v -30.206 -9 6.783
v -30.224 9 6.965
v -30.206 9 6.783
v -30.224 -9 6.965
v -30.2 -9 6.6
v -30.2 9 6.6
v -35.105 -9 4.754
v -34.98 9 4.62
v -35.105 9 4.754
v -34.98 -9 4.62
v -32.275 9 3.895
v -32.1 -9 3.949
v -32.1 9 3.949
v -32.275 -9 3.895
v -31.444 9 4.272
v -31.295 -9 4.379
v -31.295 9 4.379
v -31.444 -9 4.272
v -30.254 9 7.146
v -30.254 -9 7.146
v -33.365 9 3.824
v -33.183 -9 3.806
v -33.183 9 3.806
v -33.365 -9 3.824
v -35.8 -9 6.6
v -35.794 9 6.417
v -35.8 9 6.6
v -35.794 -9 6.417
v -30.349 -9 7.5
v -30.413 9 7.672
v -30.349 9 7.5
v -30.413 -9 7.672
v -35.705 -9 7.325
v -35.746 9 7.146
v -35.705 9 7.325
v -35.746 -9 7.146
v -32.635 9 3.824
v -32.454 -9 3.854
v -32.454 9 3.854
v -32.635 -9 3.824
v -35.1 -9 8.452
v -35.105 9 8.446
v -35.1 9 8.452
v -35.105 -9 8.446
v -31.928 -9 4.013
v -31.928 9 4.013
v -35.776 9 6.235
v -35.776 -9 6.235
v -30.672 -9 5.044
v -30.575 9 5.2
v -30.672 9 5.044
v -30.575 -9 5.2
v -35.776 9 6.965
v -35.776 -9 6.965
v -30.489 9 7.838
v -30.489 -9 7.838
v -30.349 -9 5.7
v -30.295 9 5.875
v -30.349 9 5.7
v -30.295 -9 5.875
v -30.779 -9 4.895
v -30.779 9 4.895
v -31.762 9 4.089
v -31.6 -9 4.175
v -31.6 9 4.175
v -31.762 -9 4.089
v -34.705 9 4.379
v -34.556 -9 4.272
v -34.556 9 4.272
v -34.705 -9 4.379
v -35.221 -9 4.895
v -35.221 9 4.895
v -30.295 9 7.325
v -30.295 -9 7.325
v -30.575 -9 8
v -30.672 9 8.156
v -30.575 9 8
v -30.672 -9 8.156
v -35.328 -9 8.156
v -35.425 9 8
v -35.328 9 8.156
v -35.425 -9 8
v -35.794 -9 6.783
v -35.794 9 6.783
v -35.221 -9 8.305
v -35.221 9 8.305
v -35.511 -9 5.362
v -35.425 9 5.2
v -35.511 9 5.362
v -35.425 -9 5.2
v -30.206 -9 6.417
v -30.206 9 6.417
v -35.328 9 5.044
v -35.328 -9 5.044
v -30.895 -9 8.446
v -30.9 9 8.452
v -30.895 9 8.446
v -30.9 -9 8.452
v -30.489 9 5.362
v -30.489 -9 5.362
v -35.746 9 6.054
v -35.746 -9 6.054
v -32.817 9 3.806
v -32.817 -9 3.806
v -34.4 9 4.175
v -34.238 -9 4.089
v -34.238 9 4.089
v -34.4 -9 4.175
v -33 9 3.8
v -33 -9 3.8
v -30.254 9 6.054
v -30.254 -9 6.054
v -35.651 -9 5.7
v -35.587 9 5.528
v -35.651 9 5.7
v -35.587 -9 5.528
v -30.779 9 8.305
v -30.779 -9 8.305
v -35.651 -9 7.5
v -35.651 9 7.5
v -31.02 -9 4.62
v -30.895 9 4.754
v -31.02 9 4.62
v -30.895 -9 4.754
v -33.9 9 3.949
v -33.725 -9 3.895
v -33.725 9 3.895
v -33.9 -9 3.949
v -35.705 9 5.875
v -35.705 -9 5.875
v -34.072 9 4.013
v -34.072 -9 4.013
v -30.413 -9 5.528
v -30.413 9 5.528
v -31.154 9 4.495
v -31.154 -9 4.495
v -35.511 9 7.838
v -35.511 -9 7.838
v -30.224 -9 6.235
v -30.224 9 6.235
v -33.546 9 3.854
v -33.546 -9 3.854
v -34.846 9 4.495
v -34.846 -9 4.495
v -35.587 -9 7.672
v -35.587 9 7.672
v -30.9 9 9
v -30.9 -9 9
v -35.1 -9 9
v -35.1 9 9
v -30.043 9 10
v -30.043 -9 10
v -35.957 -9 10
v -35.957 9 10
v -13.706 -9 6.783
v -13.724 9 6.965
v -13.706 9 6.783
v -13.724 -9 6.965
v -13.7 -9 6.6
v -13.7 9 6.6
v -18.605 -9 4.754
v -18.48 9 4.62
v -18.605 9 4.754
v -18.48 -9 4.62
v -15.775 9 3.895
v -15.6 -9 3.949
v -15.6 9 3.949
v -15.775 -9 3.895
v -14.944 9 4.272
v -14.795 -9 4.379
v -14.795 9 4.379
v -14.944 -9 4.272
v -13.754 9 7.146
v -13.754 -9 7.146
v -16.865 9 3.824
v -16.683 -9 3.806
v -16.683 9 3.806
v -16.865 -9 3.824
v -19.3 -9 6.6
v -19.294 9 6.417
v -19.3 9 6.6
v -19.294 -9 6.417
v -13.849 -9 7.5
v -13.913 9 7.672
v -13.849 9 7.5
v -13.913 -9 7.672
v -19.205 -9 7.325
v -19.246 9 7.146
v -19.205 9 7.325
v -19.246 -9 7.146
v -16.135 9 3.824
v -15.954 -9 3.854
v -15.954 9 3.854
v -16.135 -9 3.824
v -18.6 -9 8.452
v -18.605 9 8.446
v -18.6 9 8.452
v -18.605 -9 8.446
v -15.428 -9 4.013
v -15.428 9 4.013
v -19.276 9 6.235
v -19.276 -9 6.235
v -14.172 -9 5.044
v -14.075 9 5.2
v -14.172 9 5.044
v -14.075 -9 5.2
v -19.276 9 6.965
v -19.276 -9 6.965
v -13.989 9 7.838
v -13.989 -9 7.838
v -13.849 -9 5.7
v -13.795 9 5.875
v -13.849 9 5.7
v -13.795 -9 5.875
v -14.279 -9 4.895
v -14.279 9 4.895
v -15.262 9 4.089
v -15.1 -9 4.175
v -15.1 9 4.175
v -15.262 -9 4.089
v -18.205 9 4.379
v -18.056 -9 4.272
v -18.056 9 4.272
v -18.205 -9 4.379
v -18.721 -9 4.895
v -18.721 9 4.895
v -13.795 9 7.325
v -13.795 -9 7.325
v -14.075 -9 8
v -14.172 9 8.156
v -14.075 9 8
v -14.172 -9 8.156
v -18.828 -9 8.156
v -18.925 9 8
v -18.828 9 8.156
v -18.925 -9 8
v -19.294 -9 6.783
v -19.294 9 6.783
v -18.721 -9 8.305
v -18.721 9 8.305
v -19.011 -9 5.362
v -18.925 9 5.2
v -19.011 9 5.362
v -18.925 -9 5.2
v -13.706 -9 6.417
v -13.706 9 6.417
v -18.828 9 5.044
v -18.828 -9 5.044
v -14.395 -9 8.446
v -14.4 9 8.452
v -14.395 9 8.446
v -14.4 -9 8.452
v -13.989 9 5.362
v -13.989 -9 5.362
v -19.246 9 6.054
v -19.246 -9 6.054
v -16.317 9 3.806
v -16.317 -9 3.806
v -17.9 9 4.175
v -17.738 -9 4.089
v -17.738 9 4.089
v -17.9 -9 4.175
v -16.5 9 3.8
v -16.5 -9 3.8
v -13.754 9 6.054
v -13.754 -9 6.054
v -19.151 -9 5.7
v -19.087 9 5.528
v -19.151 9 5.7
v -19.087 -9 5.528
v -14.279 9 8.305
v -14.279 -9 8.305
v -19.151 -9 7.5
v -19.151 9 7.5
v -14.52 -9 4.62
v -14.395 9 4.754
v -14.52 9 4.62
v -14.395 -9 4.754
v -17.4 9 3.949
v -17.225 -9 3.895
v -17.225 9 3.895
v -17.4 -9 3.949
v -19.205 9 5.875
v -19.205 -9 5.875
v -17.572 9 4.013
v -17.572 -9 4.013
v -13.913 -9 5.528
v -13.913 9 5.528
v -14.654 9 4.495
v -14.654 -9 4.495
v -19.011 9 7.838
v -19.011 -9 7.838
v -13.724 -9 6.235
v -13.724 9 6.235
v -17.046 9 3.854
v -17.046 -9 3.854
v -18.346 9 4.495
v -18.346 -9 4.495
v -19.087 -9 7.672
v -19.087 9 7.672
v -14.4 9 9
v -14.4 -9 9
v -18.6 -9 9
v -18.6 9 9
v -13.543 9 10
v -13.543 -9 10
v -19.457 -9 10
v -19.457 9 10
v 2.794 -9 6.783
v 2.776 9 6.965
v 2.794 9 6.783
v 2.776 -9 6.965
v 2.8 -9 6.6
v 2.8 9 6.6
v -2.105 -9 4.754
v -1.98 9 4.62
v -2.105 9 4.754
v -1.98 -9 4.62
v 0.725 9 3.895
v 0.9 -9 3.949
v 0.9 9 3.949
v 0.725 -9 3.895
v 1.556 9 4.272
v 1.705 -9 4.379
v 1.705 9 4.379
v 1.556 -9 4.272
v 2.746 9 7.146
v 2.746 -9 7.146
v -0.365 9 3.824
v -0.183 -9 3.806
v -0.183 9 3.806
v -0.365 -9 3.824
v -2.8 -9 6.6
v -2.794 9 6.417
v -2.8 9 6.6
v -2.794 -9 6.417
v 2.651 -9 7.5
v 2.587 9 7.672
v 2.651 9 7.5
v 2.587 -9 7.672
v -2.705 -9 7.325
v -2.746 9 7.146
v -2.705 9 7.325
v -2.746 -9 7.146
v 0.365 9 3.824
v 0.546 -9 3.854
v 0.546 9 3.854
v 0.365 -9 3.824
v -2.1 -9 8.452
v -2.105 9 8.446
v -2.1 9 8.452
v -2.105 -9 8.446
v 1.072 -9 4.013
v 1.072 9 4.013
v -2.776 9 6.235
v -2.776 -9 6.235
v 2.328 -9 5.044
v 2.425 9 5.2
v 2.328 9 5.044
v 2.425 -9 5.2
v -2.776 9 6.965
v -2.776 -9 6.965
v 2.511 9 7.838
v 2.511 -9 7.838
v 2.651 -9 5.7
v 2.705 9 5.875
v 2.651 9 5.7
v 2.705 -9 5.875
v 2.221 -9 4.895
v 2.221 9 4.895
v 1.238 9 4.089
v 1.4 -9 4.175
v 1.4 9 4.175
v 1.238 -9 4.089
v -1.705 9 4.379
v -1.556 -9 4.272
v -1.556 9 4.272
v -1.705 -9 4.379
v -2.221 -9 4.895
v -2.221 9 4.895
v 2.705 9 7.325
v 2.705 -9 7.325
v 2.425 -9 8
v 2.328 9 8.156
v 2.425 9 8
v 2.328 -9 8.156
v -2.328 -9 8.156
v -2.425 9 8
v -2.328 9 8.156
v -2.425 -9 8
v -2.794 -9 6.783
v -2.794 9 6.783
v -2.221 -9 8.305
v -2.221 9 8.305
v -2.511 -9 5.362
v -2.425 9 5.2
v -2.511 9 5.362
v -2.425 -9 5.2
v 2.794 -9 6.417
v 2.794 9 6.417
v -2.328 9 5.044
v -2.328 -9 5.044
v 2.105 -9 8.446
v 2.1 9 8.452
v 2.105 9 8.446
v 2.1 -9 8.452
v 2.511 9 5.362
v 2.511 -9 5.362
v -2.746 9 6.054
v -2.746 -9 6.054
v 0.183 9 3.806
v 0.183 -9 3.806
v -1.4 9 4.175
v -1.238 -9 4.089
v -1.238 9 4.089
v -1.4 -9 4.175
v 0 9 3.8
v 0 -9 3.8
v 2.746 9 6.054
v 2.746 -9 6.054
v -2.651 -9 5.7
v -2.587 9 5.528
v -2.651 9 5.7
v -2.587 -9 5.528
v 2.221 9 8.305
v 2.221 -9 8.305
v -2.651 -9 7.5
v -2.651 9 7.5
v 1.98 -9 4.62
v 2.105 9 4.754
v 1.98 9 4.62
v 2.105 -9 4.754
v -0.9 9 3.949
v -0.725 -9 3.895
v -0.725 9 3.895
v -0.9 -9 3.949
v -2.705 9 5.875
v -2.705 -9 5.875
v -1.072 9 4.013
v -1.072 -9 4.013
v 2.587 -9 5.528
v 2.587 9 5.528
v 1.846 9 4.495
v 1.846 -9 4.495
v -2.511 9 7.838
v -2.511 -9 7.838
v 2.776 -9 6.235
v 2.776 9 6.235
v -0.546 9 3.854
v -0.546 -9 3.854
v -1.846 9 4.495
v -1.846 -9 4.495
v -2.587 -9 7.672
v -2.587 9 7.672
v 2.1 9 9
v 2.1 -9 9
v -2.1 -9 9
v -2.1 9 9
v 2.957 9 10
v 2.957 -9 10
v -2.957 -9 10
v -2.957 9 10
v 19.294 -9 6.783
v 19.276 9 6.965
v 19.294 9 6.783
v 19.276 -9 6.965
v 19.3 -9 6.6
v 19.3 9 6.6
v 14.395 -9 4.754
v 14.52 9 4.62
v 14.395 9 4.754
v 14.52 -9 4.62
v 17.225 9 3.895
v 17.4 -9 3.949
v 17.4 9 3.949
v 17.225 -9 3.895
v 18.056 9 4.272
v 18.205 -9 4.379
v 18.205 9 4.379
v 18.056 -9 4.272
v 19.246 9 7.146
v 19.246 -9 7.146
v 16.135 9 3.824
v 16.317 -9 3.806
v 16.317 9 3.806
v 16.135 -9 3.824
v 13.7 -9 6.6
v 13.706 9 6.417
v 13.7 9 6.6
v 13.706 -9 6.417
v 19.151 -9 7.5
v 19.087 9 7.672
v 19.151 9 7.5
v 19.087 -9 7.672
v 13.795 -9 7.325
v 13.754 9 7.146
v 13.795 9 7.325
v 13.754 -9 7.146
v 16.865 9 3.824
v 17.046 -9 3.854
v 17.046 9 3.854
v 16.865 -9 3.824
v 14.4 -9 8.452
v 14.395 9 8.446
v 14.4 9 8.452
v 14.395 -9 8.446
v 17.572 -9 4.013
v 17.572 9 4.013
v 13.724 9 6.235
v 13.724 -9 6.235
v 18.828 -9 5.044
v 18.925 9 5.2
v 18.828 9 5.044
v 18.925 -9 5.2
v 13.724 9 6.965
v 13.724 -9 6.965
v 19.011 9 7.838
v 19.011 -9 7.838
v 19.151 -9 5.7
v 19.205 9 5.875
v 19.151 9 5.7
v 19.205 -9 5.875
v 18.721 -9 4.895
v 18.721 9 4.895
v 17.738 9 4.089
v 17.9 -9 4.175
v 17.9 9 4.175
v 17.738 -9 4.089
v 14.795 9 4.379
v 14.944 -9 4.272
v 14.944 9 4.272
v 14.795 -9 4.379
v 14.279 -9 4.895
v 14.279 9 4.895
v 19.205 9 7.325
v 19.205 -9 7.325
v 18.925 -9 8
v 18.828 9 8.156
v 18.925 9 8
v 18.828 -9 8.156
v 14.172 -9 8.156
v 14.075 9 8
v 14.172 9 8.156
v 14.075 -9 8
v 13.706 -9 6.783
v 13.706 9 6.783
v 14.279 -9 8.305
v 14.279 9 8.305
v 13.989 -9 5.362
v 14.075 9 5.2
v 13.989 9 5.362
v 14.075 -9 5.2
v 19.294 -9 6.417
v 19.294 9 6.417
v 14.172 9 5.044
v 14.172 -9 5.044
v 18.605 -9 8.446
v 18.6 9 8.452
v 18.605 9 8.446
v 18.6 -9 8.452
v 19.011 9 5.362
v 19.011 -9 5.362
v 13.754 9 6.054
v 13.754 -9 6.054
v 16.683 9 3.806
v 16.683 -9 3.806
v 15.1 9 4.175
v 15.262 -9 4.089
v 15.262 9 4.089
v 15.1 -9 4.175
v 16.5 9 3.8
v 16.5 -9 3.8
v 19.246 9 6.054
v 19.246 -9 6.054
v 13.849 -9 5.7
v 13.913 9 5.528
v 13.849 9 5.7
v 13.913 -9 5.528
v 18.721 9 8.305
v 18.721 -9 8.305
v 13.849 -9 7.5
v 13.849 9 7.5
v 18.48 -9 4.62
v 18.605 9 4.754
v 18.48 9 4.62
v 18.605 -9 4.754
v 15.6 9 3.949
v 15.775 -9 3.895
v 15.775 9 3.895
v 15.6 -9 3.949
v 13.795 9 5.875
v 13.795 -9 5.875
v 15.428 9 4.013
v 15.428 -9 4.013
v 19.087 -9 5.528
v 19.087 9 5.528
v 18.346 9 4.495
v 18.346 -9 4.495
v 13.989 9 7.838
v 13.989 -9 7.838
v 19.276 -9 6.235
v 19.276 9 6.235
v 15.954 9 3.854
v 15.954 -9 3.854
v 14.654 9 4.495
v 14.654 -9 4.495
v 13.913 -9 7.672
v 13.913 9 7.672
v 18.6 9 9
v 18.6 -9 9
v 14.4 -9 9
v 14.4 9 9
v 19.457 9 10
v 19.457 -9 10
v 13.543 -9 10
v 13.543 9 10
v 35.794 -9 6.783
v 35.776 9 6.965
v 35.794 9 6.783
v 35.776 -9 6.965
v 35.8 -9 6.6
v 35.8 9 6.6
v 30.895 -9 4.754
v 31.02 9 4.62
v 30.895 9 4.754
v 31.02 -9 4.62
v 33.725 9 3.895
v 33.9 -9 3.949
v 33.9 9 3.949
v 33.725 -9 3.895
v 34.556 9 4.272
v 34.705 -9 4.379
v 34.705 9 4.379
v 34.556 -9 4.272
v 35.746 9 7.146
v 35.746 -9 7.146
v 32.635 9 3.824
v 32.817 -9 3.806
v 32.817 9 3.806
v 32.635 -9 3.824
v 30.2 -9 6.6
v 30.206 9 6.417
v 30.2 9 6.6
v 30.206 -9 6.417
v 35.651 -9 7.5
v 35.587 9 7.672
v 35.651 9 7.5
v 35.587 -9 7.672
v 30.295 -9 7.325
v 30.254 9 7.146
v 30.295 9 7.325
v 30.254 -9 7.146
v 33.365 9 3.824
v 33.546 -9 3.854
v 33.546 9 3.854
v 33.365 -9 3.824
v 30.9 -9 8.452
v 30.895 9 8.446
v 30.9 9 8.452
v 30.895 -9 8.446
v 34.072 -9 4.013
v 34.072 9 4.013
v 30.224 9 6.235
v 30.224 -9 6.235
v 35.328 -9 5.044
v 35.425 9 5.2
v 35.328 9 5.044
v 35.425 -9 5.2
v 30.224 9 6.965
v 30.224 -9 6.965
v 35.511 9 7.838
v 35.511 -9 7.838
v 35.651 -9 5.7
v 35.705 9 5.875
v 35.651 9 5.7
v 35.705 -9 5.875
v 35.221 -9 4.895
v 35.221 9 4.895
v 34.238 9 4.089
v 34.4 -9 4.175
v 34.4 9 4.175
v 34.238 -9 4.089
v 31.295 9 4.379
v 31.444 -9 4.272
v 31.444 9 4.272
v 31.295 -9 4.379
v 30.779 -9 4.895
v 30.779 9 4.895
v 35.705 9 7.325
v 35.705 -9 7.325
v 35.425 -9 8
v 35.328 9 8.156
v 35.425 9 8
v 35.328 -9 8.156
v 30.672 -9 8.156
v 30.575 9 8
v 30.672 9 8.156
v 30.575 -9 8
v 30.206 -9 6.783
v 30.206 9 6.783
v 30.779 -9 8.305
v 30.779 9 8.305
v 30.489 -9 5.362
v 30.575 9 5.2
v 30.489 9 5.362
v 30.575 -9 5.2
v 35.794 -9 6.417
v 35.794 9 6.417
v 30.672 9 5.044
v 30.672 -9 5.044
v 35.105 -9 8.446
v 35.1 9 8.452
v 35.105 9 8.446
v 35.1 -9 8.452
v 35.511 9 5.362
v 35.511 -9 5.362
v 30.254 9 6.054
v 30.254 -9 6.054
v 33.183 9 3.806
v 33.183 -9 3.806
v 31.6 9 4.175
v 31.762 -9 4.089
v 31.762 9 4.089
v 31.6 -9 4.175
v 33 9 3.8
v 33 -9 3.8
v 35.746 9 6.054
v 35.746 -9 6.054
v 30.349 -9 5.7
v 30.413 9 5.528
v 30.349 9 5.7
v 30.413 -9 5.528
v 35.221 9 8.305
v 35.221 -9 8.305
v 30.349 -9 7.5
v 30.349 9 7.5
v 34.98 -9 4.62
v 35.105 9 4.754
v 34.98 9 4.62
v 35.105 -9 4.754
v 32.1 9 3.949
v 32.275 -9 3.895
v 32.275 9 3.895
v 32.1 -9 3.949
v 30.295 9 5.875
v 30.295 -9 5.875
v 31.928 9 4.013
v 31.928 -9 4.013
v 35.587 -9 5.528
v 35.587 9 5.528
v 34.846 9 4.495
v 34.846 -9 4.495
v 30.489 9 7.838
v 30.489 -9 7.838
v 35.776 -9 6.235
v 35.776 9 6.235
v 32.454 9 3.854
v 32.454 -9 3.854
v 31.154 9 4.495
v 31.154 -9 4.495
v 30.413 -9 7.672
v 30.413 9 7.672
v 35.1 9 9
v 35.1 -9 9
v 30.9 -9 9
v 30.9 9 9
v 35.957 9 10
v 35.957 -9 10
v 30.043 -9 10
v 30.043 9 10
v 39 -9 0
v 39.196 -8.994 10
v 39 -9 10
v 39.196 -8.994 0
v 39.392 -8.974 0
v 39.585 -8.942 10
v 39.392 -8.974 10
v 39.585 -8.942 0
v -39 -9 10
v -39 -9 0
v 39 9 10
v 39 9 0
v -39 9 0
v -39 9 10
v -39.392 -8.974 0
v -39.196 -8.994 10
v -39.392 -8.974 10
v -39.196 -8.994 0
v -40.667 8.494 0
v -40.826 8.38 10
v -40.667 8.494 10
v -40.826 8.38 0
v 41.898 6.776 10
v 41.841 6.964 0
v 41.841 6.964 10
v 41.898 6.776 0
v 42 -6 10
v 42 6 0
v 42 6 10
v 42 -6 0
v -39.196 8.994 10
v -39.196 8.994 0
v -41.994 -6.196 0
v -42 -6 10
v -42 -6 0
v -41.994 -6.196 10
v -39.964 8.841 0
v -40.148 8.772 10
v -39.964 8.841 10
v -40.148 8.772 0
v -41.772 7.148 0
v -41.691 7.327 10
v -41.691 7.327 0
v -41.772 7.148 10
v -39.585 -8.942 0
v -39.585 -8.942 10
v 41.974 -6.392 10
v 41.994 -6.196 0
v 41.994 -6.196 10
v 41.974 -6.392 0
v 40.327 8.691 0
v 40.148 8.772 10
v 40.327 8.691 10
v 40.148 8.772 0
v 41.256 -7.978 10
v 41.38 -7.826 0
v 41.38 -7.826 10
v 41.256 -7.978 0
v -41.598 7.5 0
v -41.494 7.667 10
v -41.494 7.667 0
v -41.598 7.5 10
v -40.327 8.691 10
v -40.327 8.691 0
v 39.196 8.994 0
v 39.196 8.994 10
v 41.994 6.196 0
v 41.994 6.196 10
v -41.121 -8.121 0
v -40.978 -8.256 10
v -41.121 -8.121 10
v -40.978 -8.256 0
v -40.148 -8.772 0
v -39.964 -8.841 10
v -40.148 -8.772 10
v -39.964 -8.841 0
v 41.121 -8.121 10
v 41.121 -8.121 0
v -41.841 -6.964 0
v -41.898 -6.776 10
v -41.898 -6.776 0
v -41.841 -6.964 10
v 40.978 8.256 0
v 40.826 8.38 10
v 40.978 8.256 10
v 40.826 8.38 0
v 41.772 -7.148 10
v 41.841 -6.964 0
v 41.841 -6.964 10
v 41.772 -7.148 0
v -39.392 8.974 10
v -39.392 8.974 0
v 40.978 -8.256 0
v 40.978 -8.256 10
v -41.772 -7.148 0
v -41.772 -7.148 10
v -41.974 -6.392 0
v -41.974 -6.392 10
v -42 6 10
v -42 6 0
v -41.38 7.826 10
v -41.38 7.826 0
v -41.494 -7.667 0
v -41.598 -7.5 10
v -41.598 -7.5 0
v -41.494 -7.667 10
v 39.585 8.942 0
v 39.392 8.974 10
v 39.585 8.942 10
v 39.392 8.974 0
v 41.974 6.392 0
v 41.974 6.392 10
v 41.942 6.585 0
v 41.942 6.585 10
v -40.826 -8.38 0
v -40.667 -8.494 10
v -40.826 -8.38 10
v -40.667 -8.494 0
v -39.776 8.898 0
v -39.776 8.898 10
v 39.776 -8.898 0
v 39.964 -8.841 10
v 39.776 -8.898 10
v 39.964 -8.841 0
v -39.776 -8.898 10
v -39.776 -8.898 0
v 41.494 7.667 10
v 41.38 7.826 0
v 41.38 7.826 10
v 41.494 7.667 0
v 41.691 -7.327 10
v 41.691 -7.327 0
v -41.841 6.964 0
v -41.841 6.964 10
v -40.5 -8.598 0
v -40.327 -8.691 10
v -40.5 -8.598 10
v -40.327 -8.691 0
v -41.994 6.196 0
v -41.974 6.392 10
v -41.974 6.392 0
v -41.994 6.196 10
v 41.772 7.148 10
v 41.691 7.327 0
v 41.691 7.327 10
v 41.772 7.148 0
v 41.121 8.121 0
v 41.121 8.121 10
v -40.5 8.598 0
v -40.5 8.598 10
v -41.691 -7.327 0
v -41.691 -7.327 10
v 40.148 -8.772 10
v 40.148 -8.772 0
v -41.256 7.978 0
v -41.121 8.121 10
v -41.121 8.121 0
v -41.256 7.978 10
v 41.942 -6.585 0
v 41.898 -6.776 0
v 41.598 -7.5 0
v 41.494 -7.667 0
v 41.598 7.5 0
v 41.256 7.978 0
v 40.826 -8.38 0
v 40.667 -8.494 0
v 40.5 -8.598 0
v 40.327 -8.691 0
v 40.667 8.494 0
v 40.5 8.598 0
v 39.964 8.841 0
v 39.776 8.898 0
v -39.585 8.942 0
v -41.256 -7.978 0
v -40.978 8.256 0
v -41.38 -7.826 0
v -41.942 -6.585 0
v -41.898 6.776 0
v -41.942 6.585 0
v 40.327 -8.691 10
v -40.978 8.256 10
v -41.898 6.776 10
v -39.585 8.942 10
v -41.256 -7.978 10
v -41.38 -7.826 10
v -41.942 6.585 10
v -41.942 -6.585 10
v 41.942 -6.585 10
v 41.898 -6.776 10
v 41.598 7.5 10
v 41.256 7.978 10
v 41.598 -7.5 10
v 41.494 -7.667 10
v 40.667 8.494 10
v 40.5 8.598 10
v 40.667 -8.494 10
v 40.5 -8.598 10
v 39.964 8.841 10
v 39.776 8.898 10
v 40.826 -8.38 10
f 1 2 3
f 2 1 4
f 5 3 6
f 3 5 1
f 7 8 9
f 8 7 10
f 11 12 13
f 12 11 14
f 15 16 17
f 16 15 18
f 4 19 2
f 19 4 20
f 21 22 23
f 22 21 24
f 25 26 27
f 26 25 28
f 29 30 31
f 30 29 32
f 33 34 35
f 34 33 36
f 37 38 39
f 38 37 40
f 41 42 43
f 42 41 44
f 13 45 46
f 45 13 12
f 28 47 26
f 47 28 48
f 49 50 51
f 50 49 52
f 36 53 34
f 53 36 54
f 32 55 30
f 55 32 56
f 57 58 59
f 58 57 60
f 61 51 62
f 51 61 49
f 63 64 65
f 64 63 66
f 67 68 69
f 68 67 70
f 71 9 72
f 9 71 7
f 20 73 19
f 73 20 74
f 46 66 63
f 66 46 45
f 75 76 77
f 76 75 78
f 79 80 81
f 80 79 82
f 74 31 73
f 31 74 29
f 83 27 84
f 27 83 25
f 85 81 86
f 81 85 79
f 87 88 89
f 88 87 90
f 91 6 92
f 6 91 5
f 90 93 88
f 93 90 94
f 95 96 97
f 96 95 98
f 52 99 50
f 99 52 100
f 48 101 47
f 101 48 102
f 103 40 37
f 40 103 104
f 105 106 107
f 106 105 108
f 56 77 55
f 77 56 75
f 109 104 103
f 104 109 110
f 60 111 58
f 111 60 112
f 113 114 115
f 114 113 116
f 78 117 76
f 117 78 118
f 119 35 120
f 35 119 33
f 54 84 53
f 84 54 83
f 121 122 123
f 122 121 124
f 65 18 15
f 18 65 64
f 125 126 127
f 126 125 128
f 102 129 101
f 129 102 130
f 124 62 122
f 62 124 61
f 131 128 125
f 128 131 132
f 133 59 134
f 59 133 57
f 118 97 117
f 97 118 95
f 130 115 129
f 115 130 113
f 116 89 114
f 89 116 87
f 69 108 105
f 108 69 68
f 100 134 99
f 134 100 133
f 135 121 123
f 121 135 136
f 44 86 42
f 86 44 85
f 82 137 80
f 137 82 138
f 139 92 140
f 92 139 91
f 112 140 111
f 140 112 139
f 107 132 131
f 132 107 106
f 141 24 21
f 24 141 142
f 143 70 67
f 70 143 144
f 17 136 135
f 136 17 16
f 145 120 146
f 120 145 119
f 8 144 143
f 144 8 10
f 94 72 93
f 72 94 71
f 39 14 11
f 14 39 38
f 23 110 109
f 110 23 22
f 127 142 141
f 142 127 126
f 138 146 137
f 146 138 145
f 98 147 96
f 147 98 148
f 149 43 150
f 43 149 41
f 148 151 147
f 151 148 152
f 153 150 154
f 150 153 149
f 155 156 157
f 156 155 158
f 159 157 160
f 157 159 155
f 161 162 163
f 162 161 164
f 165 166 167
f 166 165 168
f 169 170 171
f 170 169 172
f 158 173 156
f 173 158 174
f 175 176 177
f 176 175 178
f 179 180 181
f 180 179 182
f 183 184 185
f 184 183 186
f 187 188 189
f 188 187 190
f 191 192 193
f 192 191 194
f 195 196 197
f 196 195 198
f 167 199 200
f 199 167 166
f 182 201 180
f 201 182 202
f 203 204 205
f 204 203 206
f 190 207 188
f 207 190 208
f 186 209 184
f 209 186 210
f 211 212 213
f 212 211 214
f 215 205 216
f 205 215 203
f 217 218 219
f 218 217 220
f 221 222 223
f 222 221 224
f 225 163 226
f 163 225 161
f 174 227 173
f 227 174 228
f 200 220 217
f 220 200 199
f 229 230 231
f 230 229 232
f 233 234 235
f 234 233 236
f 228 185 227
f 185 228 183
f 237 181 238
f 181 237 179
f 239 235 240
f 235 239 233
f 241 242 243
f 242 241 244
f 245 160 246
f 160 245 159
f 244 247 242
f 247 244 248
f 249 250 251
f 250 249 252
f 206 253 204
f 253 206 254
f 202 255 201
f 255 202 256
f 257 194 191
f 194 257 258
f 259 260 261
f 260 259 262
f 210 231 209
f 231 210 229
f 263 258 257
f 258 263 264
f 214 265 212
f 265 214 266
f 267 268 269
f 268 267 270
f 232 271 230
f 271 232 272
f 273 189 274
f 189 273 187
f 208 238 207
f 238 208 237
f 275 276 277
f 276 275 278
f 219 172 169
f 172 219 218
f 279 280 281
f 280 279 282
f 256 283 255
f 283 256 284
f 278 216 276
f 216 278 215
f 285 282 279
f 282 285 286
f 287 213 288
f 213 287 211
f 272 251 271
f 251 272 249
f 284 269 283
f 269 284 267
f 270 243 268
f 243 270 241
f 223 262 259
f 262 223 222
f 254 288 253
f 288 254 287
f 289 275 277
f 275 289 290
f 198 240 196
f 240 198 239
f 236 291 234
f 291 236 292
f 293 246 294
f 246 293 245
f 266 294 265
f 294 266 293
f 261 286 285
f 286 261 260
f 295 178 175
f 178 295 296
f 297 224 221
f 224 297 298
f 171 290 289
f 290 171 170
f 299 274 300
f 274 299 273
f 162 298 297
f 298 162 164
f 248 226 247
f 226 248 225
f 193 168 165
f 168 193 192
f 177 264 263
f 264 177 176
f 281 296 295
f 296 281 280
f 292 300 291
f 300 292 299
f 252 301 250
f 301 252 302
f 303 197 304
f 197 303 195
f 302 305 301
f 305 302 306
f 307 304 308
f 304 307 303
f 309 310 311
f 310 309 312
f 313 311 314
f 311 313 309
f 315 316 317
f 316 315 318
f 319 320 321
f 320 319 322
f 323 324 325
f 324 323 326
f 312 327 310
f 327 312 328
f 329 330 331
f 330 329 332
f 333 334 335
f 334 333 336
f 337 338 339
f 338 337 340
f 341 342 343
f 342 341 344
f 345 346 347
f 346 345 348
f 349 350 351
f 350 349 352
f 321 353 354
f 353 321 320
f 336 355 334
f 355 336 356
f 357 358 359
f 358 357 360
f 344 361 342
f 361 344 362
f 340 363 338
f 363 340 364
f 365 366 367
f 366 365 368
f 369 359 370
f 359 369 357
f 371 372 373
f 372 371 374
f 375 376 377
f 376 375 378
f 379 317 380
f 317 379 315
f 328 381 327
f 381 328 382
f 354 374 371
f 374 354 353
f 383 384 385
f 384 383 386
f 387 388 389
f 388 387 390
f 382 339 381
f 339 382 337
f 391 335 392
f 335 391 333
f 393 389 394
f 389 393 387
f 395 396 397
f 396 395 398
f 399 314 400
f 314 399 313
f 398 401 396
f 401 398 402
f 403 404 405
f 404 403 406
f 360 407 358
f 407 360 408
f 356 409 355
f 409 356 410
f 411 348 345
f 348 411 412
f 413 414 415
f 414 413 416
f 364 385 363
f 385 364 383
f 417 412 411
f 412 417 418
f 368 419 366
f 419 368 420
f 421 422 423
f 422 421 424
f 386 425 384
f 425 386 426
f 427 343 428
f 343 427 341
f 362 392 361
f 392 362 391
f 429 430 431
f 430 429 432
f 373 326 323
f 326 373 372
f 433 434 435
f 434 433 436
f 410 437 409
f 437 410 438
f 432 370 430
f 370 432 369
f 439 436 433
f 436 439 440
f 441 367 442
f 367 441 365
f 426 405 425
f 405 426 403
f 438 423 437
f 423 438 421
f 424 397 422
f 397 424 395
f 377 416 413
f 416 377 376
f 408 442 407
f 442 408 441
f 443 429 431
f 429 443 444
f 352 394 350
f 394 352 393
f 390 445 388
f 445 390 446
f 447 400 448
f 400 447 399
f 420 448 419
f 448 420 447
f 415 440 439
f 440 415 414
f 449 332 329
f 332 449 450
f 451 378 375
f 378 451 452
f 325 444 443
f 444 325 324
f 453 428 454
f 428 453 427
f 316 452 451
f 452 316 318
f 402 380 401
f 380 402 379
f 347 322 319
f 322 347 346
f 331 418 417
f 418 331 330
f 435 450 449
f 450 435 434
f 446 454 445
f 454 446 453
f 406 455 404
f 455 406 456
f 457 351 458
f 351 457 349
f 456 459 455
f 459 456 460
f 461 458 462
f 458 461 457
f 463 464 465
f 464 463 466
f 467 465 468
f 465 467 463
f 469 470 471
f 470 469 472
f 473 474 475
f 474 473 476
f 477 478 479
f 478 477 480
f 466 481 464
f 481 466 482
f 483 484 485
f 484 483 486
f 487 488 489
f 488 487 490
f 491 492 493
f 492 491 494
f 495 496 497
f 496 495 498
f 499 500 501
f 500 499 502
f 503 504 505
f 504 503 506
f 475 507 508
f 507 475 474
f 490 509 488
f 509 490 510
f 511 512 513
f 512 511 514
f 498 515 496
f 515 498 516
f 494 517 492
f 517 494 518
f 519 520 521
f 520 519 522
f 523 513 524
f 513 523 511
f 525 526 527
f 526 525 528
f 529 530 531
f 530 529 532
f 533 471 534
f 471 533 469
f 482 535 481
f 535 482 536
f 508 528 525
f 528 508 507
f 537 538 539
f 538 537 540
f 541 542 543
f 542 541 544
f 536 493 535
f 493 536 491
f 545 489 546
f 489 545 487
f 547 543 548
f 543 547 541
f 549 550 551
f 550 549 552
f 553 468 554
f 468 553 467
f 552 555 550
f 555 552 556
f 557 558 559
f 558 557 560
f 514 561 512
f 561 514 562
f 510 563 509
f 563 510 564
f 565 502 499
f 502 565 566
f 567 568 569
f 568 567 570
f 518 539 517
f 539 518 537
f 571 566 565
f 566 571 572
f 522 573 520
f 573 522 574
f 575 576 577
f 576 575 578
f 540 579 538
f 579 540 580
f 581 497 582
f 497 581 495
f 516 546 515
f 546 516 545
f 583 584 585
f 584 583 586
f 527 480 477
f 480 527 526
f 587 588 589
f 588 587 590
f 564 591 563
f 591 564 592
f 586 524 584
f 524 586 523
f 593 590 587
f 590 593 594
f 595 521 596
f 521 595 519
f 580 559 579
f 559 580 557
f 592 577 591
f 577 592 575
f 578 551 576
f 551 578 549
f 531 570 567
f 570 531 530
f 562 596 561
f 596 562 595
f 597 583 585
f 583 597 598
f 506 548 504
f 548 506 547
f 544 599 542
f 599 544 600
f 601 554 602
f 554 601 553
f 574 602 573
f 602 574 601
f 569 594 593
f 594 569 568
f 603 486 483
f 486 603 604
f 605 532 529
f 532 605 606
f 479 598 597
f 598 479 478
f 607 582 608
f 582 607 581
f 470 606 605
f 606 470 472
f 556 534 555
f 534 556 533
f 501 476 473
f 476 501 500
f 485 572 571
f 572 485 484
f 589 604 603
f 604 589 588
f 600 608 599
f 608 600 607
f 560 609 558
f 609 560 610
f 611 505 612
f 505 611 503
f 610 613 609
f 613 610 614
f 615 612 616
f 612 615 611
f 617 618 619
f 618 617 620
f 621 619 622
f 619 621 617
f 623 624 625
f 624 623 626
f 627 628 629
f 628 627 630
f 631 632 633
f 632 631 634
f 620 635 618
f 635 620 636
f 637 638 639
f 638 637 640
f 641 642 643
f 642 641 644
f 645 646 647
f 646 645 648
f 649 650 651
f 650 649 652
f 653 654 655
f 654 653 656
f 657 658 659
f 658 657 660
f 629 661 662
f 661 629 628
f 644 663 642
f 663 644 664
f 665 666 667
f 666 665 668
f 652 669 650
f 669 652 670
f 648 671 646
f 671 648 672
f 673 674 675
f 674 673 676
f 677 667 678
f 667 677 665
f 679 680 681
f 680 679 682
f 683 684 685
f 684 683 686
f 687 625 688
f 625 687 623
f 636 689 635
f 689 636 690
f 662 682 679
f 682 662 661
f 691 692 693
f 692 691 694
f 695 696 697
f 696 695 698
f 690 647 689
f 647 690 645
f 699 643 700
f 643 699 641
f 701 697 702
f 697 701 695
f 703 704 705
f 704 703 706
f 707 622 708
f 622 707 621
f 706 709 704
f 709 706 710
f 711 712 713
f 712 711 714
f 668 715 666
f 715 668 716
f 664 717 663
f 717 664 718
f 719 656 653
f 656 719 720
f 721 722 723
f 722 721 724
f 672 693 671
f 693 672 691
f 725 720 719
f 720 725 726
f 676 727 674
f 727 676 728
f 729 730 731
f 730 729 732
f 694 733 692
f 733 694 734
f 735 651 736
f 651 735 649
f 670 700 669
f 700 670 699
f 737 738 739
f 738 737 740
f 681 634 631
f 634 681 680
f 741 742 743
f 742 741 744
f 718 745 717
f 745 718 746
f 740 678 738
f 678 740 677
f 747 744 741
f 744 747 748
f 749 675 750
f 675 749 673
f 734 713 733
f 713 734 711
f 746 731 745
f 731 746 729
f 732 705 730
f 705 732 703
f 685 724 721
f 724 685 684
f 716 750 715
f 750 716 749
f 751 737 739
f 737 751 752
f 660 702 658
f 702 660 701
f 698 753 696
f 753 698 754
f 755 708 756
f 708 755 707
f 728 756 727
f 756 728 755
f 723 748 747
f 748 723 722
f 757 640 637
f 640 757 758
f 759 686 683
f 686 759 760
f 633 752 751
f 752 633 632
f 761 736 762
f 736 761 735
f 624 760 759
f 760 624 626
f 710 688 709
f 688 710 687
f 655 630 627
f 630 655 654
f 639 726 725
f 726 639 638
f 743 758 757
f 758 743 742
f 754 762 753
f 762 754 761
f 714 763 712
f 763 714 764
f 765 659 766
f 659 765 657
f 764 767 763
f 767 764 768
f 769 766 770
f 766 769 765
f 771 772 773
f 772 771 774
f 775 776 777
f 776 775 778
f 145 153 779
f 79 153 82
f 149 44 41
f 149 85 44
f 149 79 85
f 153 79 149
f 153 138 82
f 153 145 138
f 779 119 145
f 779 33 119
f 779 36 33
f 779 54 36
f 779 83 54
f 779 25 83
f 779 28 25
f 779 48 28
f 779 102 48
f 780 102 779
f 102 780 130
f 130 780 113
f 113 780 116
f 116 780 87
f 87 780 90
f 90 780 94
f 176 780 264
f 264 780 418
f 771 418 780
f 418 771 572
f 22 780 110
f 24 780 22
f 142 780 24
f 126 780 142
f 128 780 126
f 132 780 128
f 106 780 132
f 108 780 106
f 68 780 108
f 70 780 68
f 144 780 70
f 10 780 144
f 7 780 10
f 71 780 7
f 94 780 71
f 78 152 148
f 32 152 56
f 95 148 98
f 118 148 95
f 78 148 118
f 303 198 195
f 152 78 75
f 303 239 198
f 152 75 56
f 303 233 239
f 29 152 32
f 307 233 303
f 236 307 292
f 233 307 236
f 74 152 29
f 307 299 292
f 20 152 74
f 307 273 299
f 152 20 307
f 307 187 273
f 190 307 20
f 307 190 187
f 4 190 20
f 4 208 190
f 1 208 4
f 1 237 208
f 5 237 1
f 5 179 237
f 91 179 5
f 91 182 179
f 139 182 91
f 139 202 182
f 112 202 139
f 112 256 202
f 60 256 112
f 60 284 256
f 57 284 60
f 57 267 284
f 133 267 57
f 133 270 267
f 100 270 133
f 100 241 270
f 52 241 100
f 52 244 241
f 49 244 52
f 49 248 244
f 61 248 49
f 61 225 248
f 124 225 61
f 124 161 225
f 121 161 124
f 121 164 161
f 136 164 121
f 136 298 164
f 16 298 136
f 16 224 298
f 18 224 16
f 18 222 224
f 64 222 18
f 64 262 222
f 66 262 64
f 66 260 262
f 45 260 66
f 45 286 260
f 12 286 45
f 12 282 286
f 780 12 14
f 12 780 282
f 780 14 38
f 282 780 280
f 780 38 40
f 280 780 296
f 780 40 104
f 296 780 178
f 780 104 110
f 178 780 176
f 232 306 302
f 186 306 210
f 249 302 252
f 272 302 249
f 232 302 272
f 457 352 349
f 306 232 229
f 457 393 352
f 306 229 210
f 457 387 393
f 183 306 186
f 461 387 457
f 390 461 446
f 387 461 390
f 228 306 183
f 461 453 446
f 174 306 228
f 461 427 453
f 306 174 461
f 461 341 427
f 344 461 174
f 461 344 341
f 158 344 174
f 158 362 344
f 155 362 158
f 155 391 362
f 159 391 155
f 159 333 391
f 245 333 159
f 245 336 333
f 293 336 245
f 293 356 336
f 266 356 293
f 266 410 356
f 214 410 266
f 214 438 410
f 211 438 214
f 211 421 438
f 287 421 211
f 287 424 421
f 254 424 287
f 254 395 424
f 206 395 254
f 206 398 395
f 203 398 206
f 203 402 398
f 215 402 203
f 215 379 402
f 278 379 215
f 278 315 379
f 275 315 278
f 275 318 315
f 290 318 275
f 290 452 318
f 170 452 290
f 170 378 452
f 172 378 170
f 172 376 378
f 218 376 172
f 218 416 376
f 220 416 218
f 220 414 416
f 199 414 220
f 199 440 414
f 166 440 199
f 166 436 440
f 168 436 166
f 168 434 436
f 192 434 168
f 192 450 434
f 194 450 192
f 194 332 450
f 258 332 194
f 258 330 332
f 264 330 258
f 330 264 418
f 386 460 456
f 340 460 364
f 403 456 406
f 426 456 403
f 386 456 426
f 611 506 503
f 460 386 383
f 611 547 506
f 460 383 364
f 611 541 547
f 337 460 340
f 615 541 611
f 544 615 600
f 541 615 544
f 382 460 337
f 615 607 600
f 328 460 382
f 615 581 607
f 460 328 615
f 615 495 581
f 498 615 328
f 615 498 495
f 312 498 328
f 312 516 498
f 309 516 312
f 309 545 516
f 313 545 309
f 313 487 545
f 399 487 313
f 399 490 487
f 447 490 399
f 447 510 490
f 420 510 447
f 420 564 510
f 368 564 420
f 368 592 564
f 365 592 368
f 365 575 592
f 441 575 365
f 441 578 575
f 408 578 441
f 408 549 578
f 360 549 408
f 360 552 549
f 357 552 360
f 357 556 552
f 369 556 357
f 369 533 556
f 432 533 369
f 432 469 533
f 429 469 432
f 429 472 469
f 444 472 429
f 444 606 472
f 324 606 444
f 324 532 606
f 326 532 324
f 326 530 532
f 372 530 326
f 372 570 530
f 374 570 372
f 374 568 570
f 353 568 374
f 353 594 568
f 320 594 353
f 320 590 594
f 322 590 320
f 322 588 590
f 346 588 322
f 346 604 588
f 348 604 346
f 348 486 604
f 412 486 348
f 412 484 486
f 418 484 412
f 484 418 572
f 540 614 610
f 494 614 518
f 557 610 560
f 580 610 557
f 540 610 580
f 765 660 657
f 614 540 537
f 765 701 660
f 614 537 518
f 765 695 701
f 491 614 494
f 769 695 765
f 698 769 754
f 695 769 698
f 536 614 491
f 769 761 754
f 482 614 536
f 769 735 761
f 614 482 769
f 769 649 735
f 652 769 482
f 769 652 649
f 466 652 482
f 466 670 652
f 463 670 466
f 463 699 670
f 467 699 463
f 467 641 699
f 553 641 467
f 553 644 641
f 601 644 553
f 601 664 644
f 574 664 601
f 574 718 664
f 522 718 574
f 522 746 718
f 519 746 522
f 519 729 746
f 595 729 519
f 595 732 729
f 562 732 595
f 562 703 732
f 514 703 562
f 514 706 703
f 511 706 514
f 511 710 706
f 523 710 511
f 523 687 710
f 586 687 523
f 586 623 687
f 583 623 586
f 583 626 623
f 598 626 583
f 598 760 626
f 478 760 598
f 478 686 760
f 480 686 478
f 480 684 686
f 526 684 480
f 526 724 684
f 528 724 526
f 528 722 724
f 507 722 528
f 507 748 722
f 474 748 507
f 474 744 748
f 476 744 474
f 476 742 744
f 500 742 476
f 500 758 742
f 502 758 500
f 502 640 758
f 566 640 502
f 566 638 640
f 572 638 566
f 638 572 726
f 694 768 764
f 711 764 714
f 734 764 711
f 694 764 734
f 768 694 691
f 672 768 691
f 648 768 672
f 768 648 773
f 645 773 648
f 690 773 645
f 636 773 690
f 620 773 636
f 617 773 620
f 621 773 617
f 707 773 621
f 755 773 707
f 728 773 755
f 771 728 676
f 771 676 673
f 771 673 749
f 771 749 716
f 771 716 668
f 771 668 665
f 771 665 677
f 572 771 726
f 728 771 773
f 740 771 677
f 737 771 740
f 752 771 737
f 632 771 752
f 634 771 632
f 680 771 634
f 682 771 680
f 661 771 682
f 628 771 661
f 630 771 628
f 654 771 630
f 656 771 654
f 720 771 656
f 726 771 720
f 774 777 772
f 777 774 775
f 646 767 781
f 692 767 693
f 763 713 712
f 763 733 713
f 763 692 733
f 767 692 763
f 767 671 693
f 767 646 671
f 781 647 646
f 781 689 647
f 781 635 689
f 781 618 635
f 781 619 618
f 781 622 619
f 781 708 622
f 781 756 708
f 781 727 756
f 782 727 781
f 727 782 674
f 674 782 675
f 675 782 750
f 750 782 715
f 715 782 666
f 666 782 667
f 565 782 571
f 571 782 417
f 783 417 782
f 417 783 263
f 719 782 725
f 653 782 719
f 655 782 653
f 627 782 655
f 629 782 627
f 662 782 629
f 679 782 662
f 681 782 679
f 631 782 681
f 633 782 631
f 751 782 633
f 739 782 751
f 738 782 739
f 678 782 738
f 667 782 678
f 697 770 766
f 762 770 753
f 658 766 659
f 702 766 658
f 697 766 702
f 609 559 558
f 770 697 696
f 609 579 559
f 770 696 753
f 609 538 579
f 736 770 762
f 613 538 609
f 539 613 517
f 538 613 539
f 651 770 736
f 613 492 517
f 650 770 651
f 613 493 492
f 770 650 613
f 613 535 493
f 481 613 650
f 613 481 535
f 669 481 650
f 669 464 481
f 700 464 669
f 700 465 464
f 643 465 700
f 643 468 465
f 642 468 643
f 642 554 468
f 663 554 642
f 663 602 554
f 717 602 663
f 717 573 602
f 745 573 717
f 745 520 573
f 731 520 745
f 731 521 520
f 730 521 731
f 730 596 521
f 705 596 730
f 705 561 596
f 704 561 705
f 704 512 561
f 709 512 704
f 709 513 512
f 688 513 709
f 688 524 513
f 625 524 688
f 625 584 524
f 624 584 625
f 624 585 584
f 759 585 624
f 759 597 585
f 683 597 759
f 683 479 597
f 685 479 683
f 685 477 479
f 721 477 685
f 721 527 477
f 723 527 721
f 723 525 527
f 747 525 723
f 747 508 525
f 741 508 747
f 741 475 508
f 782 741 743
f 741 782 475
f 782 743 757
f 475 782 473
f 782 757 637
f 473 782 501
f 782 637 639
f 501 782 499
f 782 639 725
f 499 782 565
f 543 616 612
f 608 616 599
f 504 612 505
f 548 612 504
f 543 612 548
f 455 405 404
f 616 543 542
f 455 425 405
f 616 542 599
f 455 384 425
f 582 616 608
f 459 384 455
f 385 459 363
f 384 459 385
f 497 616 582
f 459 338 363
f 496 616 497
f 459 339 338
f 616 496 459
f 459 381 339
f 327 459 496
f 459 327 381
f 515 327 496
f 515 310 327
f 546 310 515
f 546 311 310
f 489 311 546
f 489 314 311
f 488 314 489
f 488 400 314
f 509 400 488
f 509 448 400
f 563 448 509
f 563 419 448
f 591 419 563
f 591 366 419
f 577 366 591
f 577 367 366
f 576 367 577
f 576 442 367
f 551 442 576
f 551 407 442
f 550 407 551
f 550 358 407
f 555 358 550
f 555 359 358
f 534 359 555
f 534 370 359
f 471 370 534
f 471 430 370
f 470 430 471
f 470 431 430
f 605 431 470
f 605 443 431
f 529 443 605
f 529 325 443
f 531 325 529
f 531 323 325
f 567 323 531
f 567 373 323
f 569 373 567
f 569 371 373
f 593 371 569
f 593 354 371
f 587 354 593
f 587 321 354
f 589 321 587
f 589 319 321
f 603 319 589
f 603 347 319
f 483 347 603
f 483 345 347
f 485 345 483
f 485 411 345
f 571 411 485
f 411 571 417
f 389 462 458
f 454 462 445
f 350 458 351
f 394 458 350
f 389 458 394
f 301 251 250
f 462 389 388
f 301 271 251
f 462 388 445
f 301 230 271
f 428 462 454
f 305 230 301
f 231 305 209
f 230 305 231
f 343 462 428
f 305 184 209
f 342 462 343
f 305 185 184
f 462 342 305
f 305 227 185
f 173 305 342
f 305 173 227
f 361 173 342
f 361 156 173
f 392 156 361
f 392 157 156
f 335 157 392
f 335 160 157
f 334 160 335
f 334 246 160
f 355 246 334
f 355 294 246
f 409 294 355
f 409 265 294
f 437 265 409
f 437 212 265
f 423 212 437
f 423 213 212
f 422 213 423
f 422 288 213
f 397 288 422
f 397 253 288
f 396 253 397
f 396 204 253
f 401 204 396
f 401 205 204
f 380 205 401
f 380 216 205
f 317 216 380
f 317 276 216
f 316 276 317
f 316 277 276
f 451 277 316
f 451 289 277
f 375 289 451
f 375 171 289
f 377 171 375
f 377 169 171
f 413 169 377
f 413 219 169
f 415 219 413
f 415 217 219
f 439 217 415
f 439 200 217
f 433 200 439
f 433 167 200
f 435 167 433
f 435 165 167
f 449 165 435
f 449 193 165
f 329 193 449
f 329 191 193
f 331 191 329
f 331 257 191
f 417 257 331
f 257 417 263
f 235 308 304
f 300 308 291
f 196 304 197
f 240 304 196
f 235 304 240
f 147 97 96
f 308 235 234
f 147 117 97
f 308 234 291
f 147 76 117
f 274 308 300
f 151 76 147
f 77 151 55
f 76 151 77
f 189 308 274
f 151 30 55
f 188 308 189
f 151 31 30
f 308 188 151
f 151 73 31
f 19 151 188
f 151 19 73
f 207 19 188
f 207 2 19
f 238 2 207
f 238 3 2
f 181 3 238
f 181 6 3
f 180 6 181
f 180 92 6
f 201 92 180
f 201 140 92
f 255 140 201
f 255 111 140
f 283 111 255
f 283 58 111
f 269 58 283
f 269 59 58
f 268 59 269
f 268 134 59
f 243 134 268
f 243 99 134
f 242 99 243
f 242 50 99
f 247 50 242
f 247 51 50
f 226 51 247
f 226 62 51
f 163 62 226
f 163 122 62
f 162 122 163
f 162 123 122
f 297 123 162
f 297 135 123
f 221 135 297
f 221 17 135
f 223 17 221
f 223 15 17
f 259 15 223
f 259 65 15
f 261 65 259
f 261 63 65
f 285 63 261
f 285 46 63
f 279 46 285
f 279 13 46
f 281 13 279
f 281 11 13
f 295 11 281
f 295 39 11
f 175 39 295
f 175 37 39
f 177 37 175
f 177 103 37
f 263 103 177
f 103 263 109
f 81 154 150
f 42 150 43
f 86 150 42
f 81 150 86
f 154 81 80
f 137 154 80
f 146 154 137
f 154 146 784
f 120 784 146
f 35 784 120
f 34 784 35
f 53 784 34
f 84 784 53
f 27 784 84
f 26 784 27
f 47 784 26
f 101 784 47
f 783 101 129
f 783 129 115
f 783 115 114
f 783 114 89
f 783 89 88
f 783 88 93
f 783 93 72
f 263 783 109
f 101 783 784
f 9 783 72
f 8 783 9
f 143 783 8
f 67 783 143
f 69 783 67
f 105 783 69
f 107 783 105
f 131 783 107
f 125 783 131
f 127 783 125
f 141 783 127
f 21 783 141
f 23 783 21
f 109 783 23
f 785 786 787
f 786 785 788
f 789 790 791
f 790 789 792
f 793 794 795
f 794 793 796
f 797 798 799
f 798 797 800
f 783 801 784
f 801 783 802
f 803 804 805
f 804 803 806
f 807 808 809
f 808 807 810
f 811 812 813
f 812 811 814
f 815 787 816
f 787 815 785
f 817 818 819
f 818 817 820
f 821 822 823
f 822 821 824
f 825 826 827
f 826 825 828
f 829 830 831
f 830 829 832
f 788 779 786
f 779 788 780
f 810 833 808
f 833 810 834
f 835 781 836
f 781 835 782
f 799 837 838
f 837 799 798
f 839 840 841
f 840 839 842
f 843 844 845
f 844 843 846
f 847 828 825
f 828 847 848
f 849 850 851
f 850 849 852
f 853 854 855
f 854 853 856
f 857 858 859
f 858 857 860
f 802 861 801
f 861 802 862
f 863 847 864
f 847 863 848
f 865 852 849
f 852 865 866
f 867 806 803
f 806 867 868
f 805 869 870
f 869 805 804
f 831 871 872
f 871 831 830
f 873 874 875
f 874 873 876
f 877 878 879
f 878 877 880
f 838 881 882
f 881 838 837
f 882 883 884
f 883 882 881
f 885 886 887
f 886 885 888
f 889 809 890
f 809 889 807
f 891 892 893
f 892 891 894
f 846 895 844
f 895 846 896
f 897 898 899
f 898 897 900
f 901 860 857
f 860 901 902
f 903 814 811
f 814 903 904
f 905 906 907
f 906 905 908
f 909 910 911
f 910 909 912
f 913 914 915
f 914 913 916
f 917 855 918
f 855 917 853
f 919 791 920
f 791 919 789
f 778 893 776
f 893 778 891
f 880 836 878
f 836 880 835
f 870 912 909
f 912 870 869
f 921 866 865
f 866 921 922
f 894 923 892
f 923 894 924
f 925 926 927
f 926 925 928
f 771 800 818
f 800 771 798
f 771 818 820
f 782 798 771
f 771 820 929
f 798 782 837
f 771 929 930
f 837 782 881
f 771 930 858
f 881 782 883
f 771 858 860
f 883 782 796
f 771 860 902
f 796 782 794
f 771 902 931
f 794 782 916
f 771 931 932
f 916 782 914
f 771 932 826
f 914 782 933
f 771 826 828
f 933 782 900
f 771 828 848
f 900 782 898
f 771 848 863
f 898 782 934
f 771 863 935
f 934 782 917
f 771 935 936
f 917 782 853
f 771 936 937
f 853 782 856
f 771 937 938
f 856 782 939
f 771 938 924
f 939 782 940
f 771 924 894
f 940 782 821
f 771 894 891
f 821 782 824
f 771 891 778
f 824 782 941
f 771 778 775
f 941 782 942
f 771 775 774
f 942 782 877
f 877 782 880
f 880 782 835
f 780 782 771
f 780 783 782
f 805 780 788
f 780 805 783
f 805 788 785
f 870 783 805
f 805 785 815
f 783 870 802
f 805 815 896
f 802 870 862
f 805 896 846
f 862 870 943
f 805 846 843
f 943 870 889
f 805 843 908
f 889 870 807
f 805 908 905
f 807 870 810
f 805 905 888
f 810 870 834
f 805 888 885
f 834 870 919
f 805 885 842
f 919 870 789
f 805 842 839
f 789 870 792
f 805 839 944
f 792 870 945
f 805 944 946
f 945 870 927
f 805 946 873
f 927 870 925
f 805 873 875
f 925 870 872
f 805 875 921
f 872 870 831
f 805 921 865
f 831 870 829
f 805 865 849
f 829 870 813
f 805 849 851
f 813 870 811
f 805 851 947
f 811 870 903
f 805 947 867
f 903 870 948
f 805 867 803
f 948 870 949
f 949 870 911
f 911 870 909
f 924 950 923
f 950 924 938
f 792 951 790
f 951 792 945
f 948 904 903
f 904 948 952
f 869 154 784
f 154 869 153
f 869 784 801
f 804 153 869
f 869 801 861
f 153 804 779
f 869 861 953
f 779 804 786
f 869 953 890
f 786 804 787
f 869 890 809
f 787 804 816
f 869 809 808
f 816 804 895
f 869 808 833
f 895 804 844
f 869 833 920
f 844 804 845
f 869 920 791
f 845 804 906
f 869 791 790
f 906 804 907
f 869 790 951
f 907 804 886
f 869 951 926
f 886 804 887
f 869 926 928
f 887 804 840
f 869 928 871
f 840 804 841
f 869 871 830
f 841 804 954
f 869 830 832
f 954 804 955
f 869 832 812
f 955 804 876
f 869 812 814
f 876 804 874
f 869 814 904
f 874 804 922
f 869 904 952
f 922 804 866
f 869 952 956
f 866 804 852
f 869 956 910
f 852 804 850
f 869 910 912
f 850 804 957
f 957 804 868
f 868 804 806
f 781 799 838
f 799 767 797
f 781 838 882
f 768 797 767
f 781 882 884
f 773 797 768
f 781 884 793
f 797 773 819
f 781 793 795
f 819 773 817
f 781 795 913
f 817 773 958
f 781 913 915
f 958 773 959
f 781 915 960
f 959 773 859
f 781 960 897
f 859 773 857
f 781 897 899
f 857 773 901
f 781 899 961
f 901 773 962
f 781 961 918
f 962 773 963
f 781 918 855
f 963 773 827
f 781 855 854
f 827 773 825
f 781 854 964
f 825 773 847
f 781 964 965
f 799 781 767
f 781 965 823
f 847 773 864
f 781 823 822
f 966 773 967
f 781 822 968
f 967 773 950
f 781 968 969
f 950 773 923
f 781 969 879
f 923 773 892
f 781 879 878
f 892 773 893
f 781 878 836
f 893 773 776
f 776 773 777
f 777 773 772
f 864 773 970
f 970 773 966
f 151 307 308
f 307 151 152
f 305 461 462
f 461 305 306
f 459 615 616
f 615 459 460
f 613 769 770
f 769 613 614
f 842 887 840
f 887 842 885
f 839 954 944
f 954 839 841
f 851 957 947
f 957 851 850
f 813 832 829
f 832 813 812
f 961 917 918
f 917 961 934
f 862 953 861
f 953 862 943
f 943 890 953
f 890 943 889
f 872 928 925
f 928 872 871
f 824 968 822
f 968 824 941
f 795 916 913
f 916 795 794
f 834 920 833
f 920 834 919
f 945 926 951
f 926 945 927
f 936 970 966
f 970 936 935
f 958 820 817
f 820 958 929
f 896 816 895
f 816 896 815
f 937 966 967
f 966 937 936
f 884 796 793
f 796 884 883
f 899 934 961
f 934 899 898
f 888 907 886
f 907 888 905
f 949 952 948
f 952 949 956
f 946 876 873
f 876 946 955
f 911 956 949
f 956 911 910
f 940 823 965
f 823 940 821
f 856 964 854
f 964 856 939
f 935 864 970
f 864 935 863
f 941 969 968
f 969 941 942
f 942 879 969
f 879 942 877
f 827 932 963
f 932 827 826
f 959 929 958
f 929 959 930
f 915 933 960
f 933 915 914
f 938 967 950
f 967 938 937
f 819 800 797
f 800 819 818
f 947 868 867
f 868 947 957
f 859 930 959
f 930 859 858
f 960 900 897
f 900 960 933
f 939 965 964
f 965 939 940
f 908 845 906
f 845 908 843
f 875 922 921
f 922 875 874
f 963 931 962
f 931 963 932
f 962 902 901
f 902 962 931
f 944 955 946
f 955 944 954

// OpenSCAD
// Cable organizer | parametric prototype, millimeters
// Open top: push a cable down into each through-groove.
// F5 preview, F6 render, then File > Export > Export as STL.

/* [Cable slots] */
slot_count = 5;           // 홈 개수
slot_pitch = 16.5;        // 홈 사이 거리
groove_diameter = 5.6;    
    // 홈 안쪽 입구 너비
throat_width = 4.2;       // 홈 위쪽 입구 너비
mouth_width = 6.0;        // 맨 위쪽 입구의 너비
entry_chamfer_height = 1.0; // [0.5:0.1:2]

/* [Body] */
end_margin = 9;           // 마지막 홈에서 양옆까지 길이
body_depth = 18;          // Body 두께
body_height = 10;         // Body 높이
floor_thickness = 3.8;    // 홈의 높이
corner_radius = 3;        // 꼭짓점의 곡률

/* [Hidden] */
$fn = 96;
eps = 0.05;
body_length = (slot_count - 1)*slot_pitch + 2*end_margin;
channel_z = floor_thickness + groove_diameter/2;
cut_length = body_depth + 2;

assert(slot_count >= 1 && slot_count == floor(slot_count));
assert(groove_diameter > 0 && throat_width > 0 && mouth_width >= throat_width);
assert(slot_pitch > max(groove_diameter,mouth_width)+1, "Increase spacing between slots.");
assert(end_margin > max(groove_diameter,mouth_width)/2+1, "Increase end margin.");
assert(body_height > channel_z, "Increase body height or reduce floor/groove size.");
assert(body_height-entry_chamfer_height > channel_z, "Entry chamfer too deep.");
assert(corner_radius >= 0 && 2*corner_radius < min(body_length,body_depth));

module rounded_body() {
    linear_extrude(height=body_height)
        if (corner_radius == 0)
            square([body_length,body_depth],center=true);
        else
            offset(r=corner_radius)
                square([body_length-2*corner_radius,body_depth-2*corner_radius],center=true);
}

module cable_channel() {
    // Circular cable seat, oriented through the front and back.
    translate([0,0,channel_z])
        rotate([90,0,0])
            cylinder(d=groove_diameter,h=cut_length,center=true);
    // Straight throat, open at the top.
    translate([-throat_width/2,-cut_length/2,channel_z-eps])
        cube([throat_width,cut_length,body_height-channel_z+2*eps]);
    // Flared entry: makes inserting a cable easier.
    rotate([90,0,0])
        linear_extrude(height=cut_length,center=true)
            polygon(points=[
                [-throat_width/2,body_height-entry_chamfer_height],
                [ throat_width/2,body_height-entry_chamfer_height],
                [ mouth_width/2,body_height+eps],
                [-mouth_width/2,body_height+eps]
            ]);
}

module cable_organizer() {
    difference() {
        rounded_body();
        for (i=[0:slot_count-1])
            translate([(i-(slot_count-1)/2)*slot_pitch,0,0])
                cable_channel();
    }
}

cable_organizer();
